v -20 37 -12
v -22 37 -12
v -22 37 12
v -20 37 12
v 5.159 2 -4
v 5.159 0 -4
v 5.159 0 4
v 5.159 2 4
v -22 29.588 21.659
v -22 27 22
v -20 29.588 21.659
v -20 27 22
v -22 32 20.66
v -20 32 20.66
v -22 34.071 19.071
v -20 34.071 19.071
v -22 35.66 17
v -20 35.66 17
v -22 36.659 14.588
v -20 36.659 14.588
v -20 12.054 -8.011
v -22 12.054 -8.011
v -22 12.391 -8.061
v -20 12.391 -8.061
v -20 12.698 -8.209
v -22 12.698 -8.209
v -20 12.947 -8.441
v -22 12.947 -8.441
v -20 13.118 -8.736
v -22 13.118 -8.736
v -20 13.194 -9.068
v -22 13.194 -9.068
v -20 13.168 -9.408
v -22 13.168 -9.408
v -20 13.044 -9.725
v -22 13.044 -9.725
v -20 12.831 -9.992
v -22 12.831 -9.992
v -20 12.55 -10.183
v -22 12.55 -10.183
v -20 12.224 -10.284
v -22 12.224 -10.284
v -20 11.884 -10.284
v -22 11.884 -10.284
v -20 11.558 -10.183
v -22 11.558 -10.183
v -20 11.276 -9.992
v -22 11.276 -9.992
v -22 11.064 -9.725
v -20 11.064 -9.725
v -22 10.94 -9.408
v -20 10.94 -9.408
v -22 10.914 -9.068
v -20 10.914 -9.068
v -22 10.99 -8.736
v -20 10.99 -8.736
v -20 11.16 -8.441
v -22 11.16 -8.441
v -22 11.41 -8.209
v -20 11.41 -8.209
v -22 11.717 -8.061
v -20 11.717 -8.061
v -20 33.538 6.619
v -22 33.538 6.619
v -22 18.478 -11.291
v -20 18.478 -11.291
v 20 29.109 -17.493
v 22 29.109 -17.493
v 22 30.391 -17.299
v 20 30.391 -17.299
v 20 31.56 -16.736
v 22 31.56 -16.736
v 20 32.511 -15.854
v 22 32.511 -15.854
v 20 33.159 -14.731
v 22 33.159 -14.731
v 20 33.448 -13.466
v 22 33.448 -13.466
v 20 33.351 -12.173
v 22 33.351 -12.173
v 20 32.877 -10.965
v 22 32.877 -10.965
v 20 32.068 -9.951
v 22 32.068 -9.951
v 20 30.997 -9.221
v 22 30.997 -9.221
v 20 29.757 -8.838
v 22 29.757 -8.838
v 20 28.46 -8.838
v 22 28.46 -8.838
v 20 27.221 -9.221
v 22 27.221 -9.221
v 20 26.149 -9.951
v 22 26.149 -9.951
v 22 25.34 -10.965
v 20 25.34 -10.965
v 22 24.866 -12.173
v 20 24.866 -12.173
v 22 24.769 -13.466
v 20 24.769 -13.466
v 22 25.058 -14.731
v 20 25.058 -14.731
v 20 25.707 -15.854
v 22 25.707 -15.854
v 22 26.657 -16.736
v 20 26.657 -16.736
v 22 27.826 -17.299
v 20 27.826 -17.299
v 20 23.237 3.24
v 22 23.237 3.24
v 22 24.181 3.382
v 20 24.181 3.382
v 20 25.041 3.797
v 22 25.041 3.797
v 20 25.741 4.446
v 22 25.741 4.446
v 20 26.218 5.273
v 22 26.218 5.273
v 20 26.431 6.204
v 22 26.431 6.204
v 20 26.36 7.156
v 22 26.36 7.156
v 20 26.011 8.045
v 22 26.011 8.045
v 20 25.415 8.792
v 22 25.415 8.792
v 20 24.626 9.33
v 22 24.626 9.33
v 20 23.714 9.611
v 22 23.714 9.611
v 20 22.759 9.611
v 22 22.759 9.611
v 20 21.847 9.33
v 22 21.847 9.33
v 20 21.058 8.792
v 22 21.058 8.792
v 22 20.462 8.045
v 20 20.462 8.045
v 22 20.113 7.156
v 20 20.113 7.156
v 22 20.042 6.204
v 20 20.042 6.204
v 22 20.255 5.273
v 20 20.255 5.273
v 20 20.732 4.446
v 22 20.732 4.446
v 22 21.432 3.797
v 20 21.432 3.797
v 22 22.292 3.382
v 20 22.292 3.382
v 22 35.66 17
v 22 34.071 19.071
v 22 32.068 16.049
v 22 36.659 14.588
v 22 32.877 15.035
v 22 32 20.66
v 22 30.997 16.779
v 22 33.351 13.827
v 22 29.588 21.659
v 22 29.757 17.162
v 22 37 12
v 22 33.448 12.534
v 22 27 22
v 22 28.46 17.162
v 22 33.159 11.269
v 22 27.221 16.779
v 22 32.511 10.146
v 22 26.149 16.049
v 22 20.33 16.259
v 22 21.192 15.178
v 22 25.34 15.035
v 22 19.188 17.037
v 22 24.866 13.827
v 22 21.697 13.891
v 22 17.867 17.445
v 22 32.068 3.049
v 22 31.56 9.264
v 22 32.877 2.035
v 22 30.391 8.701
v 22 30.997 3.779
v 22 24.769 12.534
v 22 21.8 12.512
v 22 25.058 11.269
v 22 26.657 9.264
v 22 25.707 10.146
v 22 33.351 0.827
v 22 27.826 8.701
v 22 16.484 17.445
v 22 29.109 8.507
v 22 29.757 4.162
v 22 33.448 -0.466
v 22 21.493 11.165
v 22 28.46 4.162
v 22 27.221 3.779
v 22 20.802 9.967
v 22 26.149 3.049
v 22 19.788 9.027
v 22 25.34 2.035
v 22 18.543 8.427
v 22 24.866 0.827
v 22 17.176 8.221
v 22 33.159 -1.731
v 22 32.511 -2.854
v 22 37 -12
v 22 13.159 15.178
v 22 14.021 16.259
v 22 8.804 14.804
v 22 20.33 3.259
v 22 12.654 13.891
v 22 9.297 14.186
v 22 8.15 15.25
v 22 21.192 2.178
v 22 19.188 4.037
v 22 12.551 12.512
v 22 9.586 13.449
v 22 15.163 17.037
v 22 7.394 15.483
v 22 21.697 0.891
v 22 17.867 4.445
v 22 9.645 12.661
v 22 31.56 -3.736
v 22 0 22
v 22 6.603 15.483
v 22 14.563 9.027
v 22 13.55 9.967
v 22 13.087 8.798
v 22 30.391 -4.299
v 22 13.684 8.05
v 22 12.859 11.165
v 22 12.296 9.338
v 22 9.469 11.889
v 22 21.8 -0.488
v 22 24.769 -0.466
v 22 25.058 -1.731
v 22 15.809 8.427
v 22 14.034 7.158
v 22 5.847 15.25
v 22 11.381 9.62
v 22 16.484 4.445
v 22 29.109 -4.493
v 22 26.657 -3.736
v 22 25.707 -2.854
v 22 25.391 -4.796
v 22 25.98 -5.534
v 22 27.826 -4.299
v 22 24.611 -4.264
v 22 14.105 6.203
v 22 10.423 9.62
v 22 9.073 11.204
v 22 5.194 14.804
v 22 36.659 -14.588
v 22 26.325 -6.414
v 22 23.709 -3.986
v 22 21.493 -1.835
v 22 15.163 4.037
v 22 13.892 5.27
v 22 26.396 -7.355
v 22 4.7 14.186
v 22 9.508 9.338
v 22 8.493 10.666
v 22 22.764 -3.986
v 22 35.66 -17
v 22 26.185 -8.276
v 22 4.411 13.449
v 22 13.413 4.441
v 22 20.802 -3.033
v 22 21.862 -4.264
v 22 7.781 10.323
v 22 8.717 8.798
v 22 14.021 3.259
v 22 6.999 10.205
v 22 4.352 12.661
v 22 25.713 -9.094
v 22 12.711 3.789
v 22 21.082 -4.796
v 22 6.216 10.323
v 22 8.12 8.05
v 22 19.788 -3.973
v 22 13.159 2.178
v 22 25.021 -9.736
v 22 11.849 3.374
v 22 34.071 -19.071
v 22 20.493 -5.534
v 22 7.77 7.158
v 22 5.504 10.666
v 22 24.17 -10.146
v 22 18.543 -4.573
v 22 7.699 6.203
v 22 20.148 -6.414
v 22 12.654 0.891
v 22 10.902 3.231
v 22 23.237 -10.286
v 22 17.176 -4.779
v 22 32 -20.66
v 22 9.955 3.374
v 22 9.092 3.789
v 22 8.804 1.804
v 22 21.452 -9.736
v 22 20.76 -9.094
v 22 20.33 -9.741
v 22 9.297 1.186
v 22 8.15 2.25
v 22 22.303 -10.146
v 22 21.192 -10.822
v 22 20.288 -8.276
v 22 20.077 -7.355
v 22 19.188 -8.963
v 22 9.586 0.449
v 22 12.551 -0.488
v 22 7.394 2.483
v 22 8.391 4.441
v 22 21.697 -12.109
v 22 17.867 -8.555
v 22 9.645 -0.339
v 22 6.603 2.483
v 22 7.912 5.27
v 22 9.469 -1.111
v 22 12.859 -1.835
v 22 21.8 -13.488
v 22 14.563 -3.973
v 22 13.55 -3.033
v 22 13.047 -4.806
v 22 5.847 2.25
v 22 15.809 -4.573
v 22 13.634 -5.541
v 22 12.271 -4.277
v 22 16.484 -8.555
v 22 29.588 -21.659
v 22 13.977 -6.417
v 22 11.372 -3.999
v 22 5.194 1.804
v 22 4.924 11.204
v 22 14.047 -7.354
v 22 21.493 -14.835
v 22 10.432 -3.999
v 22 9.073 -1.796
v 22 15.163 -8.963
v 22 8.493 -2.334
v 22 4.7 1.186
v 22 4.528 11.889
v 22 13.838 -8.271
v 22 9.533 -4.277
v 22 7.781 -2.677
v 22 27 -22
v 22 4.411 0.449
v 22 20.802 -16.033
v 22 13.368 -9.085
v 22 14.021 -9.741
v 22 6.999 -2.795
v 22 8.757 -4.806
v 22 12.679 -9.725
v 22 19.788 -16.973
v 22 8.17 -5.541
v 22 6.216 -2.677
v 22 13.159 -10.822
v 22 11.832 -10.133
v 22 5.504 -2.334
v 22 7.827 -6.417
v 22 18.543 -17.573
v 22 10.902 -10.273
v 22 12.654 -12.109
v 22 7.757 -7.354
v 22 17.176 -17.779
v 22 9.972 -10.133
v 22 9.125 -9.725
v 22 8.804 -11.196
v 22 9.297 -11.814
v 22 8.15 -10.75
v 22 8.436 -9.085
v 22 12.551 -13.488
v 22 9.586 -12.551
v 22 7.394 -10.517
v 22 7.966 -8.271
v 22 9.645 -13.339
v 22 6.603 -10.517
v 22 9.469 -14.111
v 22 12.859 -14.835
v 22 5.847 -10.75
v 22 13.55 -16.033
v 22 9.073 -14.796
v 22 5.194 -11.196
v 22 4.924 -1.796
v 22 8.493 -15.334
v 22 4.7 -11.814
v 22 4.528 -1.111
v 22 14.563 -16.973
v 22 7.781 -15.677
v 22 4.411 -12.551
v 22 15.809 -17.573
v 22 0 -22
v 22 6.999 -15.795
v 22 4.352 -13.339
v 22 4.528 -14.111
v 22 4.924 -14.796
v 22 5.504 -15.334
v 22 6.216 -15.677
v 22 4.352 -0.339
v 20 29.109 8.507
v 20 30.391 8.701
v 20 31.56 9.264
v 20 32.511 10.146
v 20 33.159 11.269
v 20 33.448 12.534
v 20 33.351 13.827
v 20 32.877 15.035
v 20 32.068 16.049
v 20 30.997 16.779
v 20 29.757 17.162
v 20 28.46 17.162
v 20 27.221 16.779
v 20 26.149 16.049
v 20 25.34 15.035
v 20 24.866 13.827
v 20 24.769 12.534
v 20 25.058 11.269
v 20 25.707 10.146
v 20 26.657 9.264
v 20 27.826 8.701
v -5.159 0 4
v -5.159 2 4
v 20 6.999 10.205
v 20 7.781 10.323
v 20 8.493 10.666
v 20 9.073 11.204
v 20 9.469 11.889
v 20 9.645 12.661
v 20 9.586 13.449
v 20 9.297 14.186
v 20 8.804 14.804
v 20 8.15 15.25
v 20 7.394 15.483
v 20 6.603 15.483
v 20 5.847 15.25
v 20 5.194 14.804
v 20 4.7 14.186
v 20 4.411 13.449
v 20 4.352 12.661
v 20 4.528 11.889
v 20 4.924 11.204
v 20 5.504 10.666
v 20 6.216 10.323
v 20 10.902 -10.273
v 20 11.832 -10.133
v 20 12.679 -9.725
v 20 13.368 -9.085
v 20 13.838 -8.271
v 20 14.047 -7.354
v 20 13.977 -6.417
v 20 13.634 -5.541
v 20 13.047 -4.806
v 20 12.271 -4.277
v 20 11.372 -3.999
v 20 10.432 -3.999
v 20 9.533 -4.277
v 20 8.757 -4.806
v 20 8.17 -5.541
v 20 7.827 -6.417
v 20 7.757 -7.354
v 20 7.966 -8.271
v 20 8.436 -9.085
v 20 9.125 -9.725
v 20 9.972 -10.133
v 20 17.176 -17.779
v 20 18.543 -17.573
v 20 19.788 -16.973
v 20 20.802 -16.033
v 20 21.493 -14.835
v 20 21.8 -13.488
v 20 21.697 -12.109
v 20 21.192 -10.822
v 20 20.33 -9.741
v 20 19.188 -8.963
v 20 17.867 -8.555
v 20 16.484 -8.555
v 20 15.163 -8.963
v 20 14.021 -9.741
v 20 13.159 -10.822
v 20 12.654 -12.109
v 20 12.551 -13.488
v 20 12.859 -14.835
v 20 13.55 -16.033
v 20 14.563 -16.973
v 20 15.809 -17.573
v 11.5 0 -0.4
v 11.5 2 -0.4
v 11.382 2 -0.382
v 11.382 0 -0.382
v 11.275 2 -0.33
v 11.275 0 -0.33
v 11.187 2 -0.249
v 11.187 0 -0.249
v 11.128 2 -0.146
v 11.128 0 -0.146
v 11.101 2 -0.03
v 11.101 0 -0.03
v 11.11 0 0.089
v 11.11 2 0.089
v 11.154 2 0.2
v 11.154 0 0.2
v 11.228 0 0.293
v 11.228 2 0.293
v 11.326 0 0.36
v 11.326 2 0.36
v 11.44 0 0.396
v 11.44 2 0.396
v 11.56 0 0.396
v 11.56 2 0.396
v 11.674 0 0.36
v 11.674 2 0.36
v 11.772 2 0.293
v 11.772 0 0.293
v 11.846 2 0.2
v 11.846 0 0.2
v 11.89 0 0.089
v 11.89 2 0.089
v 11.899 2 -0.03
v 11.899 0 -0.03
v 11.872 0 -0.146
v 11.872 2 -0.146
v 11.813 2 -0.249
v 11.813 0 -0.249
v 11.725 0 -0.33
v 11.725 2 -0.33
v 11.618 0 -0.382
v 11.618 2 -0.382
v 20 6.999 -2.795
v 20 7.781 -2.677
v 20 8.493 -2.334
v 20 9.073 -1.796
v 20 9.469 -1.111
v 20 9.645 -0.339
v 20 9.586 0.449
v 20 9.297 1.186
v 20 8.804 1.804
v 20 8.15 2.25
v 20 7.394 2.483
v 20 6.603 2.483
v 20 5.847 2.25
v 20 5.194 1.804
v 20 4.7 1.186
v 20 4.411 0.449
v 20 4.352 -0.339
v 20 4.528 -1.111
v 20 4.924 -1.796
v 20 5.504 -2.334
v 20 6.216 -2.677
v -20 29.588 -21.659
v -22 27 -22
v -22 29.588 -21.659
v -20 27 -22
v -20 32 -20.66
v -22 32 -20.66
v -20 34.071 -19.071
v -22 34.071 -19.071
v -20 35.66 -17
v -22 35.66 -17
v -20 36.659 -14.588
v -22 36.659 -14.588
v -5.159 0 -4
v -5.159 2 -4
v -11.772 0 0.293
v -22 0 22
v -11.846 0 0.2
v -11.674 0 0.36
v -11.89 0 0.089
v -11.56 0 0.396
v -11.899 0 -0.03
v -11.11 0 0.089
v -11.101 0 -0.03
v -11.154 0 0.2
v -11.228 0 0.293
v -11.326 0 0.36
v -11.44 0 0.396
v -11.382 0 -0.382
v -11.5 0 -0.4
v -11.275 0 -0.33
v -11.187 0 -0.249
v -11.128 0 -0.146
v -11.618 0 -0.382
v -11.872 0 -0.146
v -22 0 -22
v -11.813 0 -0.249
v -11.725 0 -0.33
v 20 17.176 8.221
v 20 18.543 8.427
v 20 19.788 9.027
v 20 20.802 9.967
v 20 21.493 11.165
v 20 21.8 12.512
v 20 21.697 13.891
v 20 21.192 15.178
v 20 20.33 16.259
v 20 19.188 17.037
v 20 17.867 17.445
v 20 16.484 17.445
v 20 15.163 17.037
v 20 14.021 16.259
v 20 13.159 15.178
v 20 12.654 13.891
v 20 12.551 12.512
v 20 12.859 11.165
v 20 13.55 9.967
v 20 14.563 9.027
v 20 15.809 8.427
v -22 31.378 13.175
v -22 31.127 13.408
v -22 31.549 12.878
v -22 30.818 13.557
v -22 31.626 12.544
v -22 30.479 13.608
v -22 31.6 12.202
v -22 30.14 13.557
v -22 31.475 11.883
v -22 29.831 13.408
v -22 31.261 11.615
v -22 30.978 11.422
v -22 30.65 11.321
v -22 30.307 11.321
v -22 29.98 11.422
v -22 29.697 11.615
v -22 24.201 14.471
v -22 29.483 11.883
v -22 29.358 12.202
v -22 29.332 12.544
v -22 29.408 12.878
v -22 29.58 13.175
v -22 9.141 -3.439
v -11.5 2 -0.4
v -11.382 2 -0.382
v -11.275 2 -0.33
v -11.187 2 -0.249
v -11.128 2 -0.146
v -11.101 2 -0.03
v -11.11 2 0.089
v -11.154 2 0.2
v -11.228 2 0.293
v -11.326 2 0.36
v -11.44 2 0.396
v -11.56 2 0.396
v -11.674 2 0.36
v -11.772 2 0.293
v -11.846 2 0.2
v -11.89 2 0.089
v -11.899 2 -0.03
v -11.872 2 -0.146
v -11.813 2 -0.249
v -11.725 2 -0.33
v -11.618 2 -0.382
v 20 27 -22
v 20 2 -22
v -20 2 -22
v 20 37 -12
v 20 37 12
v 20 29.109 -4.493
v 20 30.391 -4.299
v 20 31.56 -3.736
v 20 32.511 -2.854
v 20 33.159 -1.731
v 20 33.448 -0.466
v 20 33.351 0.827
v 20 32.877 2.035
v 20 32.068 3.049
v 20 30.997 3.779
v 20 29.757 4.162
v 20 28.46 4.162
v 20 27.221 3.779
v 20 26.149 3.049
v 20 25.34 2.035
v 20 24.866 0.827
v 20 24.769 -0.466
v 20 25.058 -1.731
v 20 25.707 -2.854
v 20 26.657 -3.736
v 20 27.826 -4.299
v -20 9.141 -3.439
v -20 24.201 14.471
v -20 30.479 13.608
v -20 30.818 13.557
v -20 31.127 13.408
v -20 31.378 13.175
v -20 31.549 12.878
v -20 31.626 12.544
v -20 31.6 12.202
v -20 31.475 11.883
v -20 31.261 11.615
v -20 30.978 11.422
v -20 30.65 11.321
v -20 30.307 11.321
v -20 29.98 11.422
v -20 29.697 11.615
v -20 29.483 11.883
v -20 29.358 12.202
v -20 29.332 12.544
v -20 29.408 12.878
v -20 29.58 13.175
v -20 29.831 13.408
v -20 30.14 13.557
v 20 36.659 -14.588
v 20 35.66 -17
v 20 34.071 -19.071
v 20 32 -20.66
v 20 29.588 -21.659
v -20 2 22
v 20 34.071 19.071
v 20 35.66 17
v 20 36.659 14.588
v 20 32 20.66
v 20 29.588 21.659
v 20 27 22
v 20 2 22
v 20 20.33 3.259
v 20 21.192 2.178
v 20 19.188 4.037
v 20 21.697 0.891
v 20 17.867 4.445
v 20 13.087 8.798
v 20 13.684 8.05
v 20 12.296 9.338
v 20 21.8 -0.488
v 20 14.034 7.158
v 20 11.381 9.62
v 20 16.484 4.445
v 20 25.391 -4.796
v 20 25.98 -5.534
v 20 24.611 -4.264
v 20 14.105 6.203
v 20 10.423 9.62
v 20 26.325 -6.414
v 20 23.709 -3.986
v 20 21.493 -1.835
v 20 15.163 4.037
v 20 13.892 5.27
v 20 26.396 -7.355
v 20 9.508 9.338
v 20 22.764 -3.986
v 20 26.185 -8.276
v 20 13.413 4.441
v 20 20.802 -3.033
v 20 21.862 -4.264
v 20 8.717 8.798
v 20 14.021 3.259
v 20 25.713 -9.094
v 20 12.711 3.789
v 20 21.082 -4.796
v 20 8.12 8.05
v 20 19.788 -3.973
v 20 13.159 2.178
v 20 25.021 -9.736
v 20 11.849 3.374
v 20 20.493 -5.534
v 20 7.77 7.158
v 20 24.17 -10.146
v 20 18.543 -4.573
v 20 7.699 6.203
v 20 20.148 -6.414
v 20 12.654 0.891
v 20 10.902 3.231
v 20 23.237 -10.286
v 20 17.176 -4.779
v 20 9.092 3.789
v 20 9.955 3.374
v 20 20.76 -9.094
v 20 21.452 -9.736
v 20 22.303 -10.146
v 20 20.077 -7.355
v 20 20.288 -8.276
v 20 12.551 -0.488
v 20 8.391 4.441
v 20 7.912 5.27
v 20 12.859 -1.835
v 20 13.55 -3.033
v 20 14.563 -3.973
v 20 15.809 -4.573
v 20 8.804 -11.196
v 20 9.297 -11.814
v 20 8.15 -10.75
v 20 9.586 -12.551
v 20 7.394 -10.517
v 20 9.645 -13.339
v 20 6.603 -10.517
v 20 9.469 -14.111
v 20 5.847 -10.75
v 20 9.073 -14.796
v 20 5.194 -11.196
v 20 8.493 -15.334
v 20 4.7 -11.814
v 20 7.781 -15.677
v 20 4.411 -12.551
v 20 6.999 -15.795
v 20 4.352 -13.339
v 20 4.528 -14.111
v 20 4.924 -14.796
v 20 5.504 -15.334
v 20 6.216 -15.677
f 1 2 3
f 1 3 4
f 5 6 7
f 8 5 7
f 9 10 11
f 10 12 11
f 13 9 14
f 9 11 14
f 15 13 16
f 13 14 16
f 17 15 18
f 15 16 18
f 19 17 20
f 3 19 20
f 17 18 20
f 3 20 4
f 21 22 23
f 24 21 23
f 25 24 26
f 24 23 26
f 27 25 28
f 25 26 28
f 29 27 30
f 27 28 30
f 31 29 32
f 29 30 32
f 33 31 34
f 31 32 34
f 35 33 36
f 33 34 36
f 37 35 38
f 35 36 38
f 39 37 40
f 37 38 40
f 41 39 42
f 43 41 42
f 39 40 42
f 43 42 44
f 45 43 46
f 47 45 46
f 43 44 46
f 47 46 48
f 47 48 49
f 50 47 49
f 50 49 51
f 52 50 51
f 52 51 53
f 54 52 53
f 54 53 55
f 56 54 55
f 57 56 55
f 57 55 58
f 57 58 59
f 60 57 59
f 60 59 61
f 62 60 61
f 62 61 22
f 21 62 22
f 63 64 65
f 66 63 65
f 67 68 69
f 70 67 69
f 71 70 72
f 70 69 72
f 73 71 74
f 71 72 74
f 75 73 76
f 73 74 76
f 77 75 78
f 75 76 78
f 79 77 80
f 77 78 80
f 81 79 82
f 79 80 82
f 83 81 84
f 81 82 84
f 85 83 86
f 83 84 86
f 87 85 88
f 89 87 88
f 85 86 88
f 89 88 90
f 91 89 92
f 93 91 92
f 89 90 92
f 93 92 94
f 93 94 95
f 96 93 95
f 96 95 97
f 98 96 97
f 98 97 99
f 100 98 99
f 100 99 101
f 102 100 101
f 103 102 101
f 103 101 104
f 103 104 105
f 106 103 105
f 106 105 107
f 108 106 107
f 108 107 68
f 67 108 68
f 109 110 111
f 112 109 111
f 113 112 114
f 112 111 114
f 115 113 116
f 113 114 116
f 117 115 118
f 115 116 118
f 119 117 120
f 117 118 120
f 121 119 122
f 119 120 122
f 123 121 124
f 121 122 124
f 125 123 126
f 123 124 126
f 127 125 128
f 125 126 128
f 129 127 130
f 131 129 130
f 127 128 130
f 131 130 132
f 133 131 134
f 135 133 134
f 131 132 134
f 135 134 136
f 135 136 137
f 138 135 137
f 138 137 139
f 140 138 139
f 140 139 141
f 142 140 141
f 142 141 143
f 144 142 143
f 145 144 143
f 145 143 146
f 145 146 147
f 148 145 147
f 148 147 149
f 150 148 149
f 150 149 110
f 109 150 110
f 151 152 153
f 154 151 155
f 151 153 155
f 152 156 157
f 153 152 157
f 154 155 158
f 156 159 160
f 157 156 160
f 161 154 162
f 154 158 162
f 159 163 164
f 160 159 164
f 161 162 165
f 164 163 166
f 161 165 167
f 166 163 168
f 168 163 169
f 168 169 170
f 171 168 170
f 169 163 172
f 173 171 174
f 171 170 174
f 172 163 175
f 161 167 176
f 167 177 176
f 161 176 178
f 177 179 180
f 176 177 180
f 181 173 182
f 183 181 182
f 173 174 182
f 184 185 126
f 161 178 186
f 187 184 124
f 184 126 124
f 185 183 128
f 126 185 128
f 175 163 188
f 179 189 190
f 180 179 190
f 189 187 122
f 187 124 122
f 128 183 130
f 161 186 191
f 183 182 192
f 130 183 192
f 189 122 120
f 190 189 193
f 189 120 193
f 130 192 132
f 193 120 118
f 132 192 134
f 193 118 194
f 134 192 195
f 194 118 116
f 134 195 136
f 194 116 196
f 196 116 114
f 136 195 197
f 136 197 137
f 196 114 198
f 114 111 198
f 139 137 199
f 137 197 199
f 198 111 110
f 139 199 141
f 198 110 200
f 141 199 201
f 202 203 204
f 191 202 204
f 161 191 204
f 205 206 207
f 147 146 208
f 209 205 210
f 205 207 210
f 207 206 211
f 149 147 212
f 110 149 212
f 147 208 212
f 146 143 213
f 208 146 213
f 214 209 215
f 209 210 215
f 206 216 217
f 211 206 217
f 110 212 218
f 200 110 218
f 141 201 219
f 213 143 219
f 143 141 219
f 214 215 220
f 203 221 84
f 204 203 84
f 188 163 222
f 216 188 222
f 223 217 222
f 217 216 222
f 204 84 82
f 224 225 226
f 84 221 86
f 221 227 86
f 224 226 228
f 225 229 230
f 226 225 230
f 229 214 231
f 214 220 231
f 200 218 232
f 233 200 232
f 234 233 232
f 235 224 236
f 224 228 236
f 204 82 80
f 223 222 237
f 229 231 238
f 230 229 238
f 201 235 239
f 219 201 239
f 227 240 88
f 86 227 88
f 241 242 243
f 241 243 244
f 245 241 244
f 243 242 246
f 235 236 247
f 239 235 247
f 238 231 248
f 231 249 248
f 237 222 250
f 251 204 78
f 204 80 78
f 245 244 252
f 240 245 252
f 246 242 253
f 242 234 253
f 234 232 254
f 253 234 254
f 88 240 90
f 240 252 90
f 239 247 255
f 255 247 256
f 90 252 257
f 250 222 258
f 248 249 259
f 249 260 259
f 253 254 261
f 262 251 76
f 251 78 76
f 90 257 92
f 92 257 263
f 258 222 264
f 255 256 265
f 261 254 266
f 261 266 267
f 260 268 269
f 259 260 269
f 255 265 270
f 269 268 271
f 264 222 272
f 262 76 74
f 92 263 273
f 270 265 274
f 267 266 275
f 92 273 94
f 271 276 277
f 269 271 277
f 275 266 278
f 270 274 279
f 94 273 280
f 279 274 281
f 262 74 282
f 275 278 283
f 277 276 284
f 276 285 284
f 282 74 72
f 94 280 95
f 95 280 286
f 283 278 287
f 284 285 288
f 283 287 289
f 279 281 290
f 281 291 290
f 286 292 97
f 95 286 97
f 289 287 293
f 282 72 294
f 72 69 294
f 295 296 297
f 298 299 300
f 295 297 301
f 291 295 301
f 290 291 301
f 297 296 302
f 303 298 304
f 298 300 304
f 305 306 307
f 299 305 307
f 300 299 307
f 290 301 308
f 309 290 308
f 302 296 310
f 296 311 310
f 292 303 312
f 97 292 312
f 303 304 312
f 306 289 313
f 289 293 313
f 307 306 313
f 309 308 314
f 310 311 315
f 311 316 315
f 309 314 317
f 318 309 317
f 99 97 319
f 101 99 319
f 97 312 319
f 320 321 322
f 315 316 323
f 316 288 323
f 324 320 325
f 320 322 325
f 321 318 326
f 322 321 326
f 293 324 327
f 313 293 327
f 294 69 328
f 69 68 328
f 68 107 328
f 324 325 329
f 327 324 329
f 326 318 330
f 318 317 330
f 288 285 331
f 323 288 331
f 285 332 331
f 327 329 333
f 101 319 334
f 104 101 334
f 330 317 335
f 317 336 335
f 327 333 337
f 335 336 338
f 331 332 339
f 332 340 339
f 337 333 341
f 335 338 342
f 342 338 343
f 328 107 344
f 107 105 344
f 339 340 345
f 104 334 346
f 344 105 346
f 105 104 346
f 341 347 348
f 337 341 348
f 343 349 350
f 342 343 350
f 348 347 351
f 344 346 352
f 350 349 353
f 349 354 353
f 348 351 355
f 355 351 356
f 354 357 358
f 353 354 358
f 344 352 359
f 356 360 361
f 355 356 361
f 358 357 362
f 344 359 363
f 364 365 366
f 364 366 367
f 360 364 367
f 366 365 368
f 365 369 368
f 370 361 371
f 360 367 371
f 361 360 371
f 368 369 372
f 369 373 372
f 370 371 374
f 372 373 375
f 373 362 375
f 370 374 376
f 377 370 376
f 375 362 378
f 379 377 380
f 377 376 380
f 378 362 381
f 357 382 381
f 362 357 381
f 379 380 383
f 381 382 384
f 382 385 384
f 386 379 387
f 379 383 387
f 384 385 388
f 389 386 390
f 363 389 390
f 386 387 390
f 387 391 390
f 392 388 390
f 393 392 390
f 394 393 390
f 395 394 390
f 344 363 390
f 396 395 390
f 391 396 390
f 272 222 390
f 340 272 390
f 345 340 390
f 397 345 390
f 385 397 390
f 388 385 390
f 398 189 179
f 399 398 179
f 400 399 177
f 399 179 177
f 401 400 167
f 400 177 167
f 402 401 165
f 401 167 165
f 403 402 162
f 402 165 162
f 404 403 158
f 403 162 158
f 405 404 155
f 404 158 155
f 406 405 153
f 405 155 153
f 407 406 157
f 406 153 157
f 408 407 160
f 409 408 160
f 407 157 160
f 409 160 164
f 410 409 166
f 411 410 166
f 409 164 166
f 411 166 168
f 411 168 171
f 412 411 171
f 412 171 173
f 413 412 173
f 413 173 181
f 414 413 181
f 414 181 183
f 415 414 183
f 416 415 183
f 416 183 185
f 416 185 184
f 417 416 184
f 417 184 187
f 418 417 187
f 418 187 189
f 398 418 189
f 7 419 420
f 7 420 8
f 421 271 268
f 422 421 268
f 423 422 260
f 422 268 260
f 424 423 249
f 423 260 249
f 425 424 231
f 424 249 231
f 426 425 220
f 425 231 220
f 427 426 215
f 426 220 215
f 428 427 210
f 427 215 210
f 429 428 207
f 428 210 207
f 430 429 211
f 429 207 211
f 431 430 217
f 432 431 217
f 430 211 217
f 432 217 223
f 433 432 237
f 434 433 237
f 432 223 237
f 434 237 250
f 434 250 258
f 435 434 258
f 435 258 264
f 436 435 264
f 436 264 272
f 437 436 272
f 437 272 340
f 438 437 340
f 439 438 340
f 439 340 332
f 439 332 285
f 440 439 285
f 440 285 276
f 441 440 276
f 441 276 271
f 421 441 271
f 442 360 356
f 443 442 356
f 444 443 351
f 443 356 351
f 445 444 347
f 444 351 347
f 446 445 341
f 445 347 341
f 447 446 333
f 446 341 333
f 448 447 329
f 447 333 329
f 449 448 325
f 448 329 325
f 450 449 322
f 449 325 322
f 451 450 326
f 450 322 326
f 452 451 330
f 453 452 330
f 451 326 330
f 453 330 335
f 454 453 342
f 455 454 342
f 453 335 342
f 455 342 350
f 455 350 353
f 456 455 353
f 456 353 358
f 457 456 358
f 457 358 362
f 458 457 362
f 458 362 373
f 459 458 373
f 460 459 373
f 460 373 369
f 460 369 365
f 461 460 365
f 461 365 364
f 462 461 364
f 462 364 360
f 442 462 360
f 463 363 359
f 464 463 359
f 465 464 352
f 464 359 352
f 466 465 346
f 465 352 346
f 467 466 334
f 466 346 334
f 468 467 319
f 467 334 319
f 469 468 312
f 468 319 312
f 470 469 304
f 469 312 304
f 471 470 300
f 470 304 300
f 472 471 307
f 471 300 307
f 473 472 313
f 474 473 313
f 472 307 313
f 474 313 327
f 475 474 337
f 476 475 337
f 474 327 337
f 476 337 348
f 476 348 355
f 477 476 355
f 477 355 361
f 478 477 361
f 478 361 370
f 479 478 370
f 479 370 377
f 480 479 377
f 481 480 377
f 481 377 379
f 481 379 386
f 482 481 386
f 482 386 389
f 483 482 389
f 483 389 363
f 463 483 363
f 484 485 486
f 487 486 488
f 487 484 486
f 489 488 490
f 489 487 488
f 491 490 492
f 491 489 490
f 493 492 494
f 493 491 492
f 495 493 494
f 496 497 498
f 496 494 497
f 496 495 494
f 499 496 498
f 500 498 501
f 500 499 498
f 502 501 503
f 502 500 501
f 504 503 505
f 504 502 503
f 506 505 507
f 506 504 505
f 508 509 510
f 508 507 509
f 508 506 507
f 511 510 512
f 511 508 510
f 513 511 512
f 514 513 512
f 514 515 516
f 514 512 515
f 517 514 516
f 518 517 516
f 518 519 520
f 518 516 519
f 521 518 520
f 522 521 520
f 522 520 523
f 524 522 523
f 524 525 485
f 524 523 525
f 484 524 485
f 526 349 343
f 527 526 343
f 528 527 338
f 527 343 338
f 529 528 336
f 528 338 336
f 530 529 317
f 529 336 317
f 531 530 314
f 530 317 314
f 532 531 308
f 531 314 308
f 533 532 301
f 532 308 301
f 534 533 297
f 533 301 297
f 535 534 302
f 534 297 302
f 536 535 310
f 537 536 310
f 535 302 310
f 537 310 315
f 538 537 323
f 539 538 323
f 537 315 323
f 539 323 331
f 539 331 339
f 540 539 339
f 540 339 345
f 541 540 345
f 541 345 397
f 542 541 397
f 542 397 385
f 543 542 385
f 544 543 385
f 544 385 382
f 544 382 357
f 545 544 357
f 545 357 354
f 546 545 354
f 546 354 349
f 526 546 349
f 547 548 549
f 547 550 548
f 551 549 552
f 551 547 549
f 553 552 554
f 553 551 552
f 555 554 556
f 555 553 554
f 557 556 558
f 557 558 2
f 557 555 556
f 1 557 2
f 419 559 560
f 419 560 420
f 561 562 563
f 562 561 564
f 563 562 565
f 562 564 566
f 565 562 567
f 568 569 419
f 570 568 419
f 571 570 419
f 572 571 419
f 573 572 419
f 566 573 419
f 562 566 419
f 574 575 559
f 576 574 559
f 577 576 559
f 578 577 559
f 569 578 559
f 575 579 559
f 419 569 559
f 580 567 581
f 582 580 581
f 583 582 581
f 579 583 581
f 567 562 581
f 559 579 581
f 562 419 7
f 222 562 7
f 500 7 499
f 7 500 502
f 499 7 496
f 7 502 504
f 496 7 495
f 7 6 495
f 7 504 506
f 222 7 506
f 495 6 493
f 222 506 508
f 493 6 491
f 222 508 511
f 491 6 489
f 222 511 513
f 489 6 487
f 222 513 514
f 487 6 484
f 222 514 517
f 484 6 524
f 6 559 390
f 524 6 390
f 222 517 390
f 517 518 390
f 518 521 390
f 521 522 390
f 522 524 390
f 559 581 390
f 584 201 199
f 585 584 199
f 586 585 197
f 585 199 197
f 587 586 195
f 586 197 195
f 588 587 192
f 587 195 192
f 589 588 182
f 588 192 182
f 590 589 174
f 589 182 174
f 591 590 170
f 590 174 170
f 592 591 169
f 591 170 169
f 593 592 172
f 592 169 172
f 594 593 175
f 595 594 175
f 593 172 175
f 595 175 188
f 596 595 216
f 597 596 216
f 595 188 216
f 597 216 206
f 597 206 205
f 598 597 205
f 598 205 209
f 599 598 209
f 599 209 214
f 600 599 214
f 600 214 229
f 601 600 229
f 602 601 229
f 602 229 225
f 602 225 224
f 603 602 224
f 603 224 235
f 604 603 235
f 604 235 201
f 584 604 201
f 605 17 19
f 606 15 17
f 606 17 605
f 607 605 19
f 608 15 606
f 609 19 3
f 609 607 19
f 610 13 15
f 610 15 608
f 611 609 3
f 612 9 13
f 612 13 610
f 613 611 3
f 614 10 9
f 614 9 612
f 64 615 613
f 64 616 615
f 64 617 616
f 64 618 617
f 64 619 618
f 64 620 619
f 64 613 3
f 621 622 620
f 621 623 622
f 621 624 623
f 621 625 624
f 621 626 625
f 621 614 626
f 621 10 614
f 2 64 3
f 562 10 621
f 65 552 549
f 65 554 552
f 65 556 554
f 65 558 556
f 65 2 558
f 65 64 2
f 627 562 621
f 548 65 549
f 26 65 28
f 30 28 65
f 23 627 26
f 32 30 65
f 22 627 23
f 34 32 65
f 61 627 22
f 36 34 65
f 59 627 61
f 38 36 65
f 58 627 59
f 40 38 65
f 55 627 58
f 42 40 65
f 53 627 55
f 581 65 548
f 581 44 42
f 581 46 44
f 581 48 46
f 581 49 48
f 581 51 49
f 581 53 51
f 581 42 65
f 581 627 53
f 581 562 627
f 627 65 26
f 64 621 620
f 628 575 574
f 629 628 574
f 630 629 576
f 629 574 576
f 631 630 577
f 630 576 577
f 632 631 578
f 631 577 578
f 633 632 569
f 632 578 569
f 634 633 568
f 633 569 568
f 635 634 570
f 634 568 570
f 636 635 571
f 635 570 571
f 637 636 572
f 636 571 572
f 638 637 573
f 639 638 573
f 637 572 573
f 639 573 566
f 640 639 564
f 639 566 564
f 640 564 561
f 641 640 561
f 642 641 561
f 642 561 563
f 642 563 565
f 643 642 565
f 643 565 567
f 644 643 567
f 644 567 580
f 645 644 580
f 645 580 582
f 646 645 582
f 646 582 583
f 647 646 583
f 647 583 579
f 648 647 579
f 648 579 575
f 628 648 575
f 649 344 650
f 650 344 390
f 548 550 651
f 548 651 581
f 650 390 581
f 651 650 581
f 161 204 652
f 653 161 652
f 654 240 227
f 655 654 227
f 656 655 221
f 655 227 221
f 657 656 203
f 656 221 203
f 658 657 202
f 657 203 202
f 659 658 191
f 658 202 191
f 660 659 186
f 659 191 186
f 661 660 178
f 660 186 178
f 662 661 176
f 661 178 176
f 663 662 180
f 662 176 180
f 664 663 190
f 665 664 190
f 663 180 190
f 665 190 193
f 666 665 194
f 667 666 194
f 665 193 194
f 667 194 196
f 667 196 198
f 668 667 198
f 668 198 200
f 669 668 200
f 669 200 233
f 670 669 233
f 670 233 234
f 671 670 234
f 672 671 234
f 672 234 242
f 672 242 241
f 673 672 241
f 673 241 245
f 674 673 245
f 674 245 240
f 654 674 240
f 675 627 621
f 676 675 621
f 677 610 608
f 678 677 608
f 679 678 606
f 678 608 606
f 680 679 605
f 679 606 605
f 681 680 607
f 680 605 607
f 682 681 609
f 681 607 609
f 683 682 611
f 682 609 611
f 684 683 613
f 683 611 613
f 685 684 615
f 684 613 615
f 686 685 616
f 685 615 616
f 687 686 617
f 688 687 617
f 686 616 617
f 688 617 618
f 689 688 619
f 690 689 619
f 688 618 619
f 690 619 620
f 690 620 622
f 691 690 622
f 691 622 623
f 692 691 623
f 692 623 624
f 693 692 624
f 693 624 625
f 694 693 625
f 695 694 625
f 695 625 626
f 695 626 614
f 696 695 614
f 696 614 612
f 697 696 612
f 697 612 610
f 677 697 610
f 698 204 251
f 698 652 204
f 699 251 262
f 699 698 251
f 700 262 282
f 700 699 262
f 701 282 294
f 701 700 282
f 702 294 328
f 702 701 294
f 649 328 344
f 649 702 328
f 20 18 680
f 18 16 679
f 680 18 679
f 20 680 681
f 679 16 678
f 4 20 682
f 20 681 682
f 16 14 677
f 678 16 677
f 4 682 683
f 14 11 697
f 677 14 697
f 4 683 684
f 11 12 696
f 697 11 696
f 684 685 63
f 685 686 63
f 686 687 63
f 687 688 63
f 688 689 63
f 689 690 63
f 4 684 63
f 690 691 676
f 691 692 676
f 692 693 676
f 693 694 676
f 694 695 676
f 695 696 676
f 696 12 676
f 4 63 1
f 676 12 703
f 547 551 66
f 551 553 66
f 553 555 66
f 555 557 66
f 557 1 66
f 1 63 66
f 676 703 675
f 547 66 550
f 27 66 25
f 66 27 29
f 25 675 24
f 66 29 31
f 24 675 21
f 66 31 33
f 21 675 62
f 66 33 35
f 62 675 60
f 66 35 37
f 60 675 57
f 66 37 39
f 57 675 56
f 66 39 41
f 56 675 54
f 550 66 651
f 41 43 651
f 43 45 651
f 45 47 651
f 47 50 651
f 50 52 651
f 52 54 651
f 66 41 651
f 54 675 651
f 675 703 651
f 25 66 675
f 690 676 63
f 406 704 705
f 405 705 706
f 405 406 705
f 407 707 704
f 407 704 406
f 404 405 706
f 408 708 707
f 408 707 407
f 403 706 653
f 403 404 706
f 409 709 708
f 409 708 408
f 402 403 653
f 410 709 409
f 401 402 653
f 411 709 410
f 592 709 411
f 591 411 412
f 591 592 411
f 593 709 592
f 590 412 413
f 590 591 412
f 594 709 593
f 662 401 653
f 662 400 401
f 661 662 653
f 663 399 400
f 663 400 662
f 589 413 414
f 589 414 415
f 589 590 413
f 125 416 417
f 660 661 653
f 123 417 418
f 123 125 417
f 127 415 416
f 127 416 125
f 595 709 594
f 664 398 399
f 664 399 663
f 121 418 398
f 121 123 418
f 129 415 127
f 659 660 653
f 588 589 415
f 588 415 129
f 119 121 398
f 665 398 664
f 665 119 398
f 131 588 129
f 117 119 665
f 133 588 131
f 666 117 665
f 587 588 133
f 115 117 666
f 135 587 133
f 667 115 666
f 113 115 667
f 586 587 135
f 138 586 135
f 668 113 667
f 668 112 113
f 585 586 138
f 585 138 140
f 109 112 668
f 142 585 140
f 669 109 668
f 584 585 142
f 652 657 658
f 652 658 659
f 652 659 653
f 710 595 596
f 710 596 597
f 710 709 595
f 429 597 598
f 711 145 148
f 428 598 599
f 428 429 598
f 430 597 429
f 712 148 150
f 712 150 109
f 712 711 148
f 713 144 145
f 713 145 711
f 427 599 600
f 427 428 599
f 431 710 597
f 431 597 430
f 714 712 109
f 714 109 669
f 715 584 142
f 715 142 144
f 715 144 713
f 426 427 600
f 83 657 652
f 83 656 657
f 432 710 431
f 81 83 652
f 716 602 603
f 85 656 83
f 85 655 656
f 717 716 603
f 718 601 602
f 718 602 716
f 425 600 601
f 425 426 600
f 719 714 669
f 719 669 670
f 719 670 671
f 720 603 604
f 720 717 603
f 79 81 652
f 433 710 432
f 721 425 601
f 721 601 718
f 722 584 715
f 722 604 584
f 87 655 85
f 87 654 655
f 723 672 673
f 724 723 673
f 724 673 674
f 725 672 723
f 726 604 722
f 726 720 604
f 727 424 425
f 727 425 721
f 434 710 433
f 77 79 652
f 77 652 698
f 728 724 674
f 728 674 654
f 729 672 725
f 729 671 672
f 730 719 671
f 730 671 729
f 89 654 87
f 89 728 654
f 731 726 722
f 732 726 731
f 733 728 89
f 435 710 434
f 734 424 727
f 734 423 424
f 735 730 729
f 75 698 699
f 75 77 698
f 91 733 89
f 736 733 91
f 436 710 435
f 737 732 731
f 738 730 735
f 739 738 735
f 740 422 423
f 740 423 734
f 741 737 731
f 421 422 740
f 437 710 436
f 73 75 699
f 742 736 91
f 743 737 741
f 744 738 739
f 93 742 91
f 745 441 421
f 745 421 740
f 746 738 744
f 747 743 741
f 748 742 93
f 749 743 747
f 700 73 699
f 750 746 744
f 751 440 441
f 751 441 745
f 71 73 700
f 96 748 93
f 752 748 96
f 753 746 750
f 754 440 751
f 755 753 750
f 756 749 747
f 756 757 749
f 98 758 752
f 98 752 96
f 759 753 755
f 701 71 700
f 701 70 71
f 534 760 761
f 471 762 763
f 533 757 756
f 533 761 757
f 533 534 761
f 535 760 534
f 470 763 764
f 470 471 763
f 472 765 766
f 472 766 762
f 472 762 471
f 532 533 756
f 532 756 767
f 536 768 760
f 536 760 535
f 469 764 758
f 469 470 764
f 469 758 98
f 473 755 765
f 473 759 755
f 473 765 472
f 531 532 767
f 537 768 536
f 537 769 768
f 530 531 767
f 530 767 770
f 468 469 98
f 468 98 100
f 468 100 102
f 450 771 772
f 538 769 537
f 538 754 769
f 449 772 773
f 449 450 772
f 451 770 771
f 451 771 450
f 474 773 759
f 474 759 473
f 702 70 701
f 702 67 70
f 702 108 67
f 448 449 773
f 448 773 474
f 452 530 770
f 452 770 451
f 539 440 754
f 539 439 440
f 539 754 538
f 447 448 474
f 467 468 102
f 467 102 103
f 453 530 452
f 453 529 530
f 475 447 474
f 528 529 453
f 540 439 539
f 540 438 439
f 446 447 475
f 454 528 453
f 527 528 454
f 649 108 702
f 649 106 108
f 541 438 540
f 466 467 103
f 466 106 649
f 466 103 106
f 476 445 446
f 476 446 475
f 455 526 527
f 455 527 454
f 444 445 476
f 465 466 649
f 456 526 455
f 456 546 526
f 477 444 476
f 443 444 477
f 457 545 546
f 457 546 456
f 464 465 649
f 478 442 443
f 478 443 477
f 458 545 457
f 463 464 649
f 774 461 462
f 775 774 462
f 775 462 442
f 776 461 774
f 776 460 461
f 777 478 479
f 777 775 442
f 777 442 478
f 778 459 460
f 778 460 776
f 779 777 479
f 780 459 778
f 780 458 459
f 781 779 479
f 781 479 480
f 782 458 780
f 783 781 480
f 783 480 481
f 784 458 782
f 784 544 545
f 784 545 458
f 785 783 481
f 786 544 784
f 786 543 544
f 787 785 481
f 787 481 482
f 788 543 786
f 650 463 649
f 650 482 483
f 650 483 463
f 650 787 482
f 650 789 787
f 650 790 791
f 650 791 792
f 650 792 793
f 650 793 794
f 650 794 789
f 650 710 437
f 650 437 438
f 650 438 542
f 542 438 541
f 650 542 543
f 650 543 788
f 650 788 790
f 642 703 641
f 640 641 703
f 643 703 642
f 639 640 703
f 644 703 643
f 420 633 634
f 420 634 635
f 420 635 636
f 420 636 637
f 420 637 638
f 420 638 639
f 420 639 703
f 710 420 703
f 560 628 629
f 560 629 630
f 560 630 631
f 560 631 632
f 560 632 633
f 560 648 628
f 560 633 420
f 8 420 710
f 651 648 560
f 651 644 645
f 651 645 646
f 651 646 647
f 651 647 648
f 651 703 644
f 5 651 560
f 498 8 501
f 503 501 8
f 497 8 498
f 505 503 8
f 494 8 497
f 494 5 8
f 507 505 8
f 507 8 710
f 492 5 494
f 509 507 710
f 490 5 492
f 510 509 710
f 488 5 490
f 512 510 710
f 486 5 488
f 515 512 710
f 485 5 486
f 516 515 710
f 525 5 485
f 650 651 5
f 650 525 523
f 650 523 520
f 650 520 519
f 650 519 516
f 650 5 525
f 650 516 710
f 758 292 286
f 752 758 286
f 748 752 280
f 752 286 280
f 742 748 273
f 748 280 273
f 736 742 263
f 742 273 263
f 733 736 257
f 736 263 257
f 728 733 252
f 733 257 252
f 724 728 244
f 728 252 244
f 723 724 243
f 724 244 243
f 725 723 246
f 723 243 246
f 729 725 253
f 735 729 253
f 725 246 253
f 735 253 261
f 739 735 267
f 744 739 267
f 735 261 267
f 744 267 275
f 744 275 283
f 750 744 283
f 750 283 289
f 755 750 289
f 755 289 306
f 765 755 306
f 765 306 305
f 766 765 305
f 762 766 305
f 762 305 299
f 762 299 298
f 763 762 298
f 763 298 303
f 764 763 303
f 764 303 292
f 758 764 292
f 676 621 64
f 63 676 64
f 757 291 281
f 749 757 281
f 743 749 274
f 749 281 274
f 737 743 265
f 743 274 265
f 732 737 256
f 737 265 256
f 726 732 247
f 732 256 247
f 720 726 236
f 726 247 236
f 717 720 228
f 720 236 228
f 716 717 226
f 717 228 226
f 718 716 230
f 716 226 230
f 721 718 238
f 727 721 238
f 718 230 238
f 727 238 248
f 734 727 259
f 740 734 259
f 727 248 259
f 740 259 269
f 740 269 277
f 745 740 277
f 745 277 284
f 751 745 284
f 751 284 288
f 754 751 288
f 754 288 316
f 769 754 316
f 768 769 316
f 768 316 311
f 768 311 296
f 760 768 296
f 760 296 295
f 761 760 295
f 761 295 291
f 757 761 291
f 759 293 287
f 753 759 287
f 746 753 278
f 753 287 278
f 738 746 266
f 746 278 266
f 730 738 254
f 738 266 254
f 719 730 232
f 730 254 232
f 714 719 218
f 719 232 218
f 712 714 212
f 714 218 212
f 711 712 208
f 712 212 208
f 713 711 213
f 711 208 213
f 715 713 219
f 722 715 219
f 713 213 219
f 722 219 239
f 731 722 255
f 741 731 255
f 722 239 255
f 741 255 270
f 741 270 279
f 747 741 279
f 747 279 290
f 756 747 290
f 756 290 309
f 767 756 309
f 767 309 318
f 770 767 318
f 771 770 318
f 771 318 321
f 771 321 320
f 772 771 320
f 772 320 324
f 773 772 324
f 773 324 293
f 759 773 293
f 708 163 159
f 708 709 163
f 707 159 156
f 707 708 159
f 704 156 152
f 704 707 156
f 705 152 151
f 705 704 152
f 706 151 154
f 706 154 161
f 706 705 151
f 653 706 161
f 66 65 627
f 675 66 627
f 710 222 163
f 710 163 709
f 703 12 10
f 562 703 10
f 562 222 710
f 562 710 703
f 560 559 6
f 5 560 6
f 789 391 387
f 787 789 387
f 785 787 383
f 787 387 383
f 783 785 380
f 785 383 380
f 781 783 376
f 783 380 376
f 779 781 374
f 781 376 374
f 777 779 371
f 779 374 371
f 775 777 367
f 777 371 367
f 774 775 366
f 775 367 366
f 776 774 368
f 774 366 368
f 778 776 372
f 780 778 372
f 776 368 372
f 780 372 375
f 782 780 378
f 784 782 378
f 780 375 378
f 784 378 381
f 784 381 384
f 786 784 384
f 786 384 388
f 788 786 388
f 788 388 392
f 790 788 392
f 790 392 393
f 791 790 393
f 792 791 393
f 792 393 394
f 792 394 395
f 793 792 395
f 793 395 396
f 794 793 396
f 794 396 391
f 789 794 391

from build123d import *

# Parameters (mm, degrees)
SKETCH2_W           = 44
SKETCH2_H           = 44
BOSS_EXTRUDE1_DEPTH = 2
SKETCH4_W           = 10.31875
SKETCH4_H           = 8
CUT_EXTRUDE1_DEPTH  = 32.176914536
SKETCH5_R           = 0.4
CUT_EXTRUDE2_DEPTH  = 3
SKETCH8_W           = 2
SKETCH8_H           = 44
BOSS_EXTRUDE2_DEPTH = 35
SKETCH11_R          = 1.143
SKETCH11_R_2        = 1.15
CUT_EXTRUDE3_DEPTH  = 10
FILLET1_R           = 10
SKETCH14_R          = 4.351447522
SKETCH14_R_2        = 4.637760651
SKETCH14_R_3        = 2.653670008
CUT_EXTRUDE5_DEPTH  = 10
LPATTERN1_COUNT     = 3
LPATTERN1_PITCH     = 13
SKETCH16_R          = 3.212197925
SKETCH16_R_2        = 3.154230468
SKETCH16_R_3        = 3.167930334
SKETCH16_R_4        = 3.203393346
CUT_EXTRUDE6_DEPTH  = 10


with BuildPart() as part:
    # Sketch2 → Boss-Extrude1 (new body)
    with BuildSketch(Plane(origin=(0, 0, 0), x_dir=(1, 0, 0), z_dir=(0, 1, 0))):
        Rectangle(SKETCH2_W, SKETCH2_H)
    extrude(amount=BOSS_EXTRUDE1_DEPTH)

    # Sketch4 → Cut-Extrude1 (cut, through all)
    with BuildSketch(Plane.XZ):
        Rectangle(SKETCH4_W, SKETCH4_H)
    extrude(amount=-CUT_EXTRUDE1_DEPTH, mode=Mode.SUBTRACT)

    # Sketch5 → Cut-Extrude2 (cut)
    with BuildSketch(Plane.XZ):
        with Locations(Location((-11.5, 0, 0), (0, 0, 270))):
            Circle(SKETCH5_R)
    cut_extrude2 = extrude(amount=-CUT_EXTRUDE2_DEPTH, mode=Mode.SUBTRACT)

    # Mirror1: Cut-Extrude2 across plane
    add(cut_extrude2.mirror(Plane(origin=(0, 0, 0), x_dir=(0, 0, 1), z_dir=(1, 0, 0))), mode=Mode.SUBTRACT)

    # Sketch8 → Boss-Extrude2 (add)
    with BuildSketch(Plane(origin=(0, 2, 0), x_dir=(1, 0, 0), z_dir=(0, 1, 0))):
        with Locations((-21, 0)):
            Rectangle(SKETCH8_W, SKETCH8_H)
    boss_extrude2 = extrude(amount=BOSS_EXTRUDE2_DEPTH)

    # Mirror2: Boss-Extrude2 across plane
    add(boss_extrude2.mirror(Plane(origin=(0, 0, 0), x_dir=(0, 0, 1), z_dir=(1, 0, 0))))

    # Sketch11 → Cut-Extrude3 (cut)
    with BuildSketch(Plane.ZY.offset(22)):
        with Locations((-9.153659498, 12.053864297)):
            Circle(SKETCH11_R)
        with Locations((12.458196086, 30.478767136)):
            Circle(SKETCH11_R_2)
        Polygon((-11.290641548, 18.478237521), (-3.43872233, 9.140820073), (14.47075048, 24.201058573), (6.618831262, 33.538476021), align=None)
    extrude(amount=-CUT_EXTRUDE3_DEPTH, mode=Mode.SUBTRACT)

    # Fillet1
    fillet1_edges = [part.edges().sort_by_distance(p)[0] for p in [
        (-21, 37, 22),
        (-21, 37, -22),
        (21, 37, -22),
        (21, 37, 22),
    ]]
    fillet(fillet1_edges, radius=FILLET1_R)

    # Sketch14 → Cut-Extrude5 (cut)
    with BuildSketch(Plane(origin=(22, 0, 0), x_dir=(0, 0, -1), z_dir=(1, 0, 0))):
        with Locations((-12.858925156, 29.108613253)):
            Circle(SKETCH14_R)
        with Locations((-12.858925156, 17.175691446)):
            Circle(SKETCH14_R_2)
        with Locations((-12.858925156, 6.998624266)):
            Circle(SKETCH14_R_3)
    cut_extrude5 = extrude(amount=-CUT_EXTRUDE5_DEPTH, mode=Mode.SUBTRACT)

    # LPattern1: Cut-Extrude5 ×3
    with Locations(*[(0, 0, -i * LPATTERN1_PITCH) for i in range(1, LPATTERN1_COUNT)]):
        add(cut_extrude5, mode=Mode.SUBTRACT)

    # Sketch16 → Cut-Extrude6 (cut)
    with BuildSketch(Plane(origin=(22, 0, 0), x_dir=(0, 0, -1), z_dir=(1, 0, 0))):
        with Locations((-6.443418132, 10.901979994)):
            Circle(SKETCH16_R)
        with Locations((7.118442889, 10.901979994)):
            Circle(SKETCH16_R_2)
        with Locations((7.118442889, 23.236523275)):
            Circle(SKETCH16_R_3)
        with Locations((-6.443418132, 23.236523275)):
            Circle(SKETCH16_R_4)
    extrude(amount=-CUT_EXTRUDE6_DEPTH, mode=Mode.SUBTRACT)


solid = part.part
